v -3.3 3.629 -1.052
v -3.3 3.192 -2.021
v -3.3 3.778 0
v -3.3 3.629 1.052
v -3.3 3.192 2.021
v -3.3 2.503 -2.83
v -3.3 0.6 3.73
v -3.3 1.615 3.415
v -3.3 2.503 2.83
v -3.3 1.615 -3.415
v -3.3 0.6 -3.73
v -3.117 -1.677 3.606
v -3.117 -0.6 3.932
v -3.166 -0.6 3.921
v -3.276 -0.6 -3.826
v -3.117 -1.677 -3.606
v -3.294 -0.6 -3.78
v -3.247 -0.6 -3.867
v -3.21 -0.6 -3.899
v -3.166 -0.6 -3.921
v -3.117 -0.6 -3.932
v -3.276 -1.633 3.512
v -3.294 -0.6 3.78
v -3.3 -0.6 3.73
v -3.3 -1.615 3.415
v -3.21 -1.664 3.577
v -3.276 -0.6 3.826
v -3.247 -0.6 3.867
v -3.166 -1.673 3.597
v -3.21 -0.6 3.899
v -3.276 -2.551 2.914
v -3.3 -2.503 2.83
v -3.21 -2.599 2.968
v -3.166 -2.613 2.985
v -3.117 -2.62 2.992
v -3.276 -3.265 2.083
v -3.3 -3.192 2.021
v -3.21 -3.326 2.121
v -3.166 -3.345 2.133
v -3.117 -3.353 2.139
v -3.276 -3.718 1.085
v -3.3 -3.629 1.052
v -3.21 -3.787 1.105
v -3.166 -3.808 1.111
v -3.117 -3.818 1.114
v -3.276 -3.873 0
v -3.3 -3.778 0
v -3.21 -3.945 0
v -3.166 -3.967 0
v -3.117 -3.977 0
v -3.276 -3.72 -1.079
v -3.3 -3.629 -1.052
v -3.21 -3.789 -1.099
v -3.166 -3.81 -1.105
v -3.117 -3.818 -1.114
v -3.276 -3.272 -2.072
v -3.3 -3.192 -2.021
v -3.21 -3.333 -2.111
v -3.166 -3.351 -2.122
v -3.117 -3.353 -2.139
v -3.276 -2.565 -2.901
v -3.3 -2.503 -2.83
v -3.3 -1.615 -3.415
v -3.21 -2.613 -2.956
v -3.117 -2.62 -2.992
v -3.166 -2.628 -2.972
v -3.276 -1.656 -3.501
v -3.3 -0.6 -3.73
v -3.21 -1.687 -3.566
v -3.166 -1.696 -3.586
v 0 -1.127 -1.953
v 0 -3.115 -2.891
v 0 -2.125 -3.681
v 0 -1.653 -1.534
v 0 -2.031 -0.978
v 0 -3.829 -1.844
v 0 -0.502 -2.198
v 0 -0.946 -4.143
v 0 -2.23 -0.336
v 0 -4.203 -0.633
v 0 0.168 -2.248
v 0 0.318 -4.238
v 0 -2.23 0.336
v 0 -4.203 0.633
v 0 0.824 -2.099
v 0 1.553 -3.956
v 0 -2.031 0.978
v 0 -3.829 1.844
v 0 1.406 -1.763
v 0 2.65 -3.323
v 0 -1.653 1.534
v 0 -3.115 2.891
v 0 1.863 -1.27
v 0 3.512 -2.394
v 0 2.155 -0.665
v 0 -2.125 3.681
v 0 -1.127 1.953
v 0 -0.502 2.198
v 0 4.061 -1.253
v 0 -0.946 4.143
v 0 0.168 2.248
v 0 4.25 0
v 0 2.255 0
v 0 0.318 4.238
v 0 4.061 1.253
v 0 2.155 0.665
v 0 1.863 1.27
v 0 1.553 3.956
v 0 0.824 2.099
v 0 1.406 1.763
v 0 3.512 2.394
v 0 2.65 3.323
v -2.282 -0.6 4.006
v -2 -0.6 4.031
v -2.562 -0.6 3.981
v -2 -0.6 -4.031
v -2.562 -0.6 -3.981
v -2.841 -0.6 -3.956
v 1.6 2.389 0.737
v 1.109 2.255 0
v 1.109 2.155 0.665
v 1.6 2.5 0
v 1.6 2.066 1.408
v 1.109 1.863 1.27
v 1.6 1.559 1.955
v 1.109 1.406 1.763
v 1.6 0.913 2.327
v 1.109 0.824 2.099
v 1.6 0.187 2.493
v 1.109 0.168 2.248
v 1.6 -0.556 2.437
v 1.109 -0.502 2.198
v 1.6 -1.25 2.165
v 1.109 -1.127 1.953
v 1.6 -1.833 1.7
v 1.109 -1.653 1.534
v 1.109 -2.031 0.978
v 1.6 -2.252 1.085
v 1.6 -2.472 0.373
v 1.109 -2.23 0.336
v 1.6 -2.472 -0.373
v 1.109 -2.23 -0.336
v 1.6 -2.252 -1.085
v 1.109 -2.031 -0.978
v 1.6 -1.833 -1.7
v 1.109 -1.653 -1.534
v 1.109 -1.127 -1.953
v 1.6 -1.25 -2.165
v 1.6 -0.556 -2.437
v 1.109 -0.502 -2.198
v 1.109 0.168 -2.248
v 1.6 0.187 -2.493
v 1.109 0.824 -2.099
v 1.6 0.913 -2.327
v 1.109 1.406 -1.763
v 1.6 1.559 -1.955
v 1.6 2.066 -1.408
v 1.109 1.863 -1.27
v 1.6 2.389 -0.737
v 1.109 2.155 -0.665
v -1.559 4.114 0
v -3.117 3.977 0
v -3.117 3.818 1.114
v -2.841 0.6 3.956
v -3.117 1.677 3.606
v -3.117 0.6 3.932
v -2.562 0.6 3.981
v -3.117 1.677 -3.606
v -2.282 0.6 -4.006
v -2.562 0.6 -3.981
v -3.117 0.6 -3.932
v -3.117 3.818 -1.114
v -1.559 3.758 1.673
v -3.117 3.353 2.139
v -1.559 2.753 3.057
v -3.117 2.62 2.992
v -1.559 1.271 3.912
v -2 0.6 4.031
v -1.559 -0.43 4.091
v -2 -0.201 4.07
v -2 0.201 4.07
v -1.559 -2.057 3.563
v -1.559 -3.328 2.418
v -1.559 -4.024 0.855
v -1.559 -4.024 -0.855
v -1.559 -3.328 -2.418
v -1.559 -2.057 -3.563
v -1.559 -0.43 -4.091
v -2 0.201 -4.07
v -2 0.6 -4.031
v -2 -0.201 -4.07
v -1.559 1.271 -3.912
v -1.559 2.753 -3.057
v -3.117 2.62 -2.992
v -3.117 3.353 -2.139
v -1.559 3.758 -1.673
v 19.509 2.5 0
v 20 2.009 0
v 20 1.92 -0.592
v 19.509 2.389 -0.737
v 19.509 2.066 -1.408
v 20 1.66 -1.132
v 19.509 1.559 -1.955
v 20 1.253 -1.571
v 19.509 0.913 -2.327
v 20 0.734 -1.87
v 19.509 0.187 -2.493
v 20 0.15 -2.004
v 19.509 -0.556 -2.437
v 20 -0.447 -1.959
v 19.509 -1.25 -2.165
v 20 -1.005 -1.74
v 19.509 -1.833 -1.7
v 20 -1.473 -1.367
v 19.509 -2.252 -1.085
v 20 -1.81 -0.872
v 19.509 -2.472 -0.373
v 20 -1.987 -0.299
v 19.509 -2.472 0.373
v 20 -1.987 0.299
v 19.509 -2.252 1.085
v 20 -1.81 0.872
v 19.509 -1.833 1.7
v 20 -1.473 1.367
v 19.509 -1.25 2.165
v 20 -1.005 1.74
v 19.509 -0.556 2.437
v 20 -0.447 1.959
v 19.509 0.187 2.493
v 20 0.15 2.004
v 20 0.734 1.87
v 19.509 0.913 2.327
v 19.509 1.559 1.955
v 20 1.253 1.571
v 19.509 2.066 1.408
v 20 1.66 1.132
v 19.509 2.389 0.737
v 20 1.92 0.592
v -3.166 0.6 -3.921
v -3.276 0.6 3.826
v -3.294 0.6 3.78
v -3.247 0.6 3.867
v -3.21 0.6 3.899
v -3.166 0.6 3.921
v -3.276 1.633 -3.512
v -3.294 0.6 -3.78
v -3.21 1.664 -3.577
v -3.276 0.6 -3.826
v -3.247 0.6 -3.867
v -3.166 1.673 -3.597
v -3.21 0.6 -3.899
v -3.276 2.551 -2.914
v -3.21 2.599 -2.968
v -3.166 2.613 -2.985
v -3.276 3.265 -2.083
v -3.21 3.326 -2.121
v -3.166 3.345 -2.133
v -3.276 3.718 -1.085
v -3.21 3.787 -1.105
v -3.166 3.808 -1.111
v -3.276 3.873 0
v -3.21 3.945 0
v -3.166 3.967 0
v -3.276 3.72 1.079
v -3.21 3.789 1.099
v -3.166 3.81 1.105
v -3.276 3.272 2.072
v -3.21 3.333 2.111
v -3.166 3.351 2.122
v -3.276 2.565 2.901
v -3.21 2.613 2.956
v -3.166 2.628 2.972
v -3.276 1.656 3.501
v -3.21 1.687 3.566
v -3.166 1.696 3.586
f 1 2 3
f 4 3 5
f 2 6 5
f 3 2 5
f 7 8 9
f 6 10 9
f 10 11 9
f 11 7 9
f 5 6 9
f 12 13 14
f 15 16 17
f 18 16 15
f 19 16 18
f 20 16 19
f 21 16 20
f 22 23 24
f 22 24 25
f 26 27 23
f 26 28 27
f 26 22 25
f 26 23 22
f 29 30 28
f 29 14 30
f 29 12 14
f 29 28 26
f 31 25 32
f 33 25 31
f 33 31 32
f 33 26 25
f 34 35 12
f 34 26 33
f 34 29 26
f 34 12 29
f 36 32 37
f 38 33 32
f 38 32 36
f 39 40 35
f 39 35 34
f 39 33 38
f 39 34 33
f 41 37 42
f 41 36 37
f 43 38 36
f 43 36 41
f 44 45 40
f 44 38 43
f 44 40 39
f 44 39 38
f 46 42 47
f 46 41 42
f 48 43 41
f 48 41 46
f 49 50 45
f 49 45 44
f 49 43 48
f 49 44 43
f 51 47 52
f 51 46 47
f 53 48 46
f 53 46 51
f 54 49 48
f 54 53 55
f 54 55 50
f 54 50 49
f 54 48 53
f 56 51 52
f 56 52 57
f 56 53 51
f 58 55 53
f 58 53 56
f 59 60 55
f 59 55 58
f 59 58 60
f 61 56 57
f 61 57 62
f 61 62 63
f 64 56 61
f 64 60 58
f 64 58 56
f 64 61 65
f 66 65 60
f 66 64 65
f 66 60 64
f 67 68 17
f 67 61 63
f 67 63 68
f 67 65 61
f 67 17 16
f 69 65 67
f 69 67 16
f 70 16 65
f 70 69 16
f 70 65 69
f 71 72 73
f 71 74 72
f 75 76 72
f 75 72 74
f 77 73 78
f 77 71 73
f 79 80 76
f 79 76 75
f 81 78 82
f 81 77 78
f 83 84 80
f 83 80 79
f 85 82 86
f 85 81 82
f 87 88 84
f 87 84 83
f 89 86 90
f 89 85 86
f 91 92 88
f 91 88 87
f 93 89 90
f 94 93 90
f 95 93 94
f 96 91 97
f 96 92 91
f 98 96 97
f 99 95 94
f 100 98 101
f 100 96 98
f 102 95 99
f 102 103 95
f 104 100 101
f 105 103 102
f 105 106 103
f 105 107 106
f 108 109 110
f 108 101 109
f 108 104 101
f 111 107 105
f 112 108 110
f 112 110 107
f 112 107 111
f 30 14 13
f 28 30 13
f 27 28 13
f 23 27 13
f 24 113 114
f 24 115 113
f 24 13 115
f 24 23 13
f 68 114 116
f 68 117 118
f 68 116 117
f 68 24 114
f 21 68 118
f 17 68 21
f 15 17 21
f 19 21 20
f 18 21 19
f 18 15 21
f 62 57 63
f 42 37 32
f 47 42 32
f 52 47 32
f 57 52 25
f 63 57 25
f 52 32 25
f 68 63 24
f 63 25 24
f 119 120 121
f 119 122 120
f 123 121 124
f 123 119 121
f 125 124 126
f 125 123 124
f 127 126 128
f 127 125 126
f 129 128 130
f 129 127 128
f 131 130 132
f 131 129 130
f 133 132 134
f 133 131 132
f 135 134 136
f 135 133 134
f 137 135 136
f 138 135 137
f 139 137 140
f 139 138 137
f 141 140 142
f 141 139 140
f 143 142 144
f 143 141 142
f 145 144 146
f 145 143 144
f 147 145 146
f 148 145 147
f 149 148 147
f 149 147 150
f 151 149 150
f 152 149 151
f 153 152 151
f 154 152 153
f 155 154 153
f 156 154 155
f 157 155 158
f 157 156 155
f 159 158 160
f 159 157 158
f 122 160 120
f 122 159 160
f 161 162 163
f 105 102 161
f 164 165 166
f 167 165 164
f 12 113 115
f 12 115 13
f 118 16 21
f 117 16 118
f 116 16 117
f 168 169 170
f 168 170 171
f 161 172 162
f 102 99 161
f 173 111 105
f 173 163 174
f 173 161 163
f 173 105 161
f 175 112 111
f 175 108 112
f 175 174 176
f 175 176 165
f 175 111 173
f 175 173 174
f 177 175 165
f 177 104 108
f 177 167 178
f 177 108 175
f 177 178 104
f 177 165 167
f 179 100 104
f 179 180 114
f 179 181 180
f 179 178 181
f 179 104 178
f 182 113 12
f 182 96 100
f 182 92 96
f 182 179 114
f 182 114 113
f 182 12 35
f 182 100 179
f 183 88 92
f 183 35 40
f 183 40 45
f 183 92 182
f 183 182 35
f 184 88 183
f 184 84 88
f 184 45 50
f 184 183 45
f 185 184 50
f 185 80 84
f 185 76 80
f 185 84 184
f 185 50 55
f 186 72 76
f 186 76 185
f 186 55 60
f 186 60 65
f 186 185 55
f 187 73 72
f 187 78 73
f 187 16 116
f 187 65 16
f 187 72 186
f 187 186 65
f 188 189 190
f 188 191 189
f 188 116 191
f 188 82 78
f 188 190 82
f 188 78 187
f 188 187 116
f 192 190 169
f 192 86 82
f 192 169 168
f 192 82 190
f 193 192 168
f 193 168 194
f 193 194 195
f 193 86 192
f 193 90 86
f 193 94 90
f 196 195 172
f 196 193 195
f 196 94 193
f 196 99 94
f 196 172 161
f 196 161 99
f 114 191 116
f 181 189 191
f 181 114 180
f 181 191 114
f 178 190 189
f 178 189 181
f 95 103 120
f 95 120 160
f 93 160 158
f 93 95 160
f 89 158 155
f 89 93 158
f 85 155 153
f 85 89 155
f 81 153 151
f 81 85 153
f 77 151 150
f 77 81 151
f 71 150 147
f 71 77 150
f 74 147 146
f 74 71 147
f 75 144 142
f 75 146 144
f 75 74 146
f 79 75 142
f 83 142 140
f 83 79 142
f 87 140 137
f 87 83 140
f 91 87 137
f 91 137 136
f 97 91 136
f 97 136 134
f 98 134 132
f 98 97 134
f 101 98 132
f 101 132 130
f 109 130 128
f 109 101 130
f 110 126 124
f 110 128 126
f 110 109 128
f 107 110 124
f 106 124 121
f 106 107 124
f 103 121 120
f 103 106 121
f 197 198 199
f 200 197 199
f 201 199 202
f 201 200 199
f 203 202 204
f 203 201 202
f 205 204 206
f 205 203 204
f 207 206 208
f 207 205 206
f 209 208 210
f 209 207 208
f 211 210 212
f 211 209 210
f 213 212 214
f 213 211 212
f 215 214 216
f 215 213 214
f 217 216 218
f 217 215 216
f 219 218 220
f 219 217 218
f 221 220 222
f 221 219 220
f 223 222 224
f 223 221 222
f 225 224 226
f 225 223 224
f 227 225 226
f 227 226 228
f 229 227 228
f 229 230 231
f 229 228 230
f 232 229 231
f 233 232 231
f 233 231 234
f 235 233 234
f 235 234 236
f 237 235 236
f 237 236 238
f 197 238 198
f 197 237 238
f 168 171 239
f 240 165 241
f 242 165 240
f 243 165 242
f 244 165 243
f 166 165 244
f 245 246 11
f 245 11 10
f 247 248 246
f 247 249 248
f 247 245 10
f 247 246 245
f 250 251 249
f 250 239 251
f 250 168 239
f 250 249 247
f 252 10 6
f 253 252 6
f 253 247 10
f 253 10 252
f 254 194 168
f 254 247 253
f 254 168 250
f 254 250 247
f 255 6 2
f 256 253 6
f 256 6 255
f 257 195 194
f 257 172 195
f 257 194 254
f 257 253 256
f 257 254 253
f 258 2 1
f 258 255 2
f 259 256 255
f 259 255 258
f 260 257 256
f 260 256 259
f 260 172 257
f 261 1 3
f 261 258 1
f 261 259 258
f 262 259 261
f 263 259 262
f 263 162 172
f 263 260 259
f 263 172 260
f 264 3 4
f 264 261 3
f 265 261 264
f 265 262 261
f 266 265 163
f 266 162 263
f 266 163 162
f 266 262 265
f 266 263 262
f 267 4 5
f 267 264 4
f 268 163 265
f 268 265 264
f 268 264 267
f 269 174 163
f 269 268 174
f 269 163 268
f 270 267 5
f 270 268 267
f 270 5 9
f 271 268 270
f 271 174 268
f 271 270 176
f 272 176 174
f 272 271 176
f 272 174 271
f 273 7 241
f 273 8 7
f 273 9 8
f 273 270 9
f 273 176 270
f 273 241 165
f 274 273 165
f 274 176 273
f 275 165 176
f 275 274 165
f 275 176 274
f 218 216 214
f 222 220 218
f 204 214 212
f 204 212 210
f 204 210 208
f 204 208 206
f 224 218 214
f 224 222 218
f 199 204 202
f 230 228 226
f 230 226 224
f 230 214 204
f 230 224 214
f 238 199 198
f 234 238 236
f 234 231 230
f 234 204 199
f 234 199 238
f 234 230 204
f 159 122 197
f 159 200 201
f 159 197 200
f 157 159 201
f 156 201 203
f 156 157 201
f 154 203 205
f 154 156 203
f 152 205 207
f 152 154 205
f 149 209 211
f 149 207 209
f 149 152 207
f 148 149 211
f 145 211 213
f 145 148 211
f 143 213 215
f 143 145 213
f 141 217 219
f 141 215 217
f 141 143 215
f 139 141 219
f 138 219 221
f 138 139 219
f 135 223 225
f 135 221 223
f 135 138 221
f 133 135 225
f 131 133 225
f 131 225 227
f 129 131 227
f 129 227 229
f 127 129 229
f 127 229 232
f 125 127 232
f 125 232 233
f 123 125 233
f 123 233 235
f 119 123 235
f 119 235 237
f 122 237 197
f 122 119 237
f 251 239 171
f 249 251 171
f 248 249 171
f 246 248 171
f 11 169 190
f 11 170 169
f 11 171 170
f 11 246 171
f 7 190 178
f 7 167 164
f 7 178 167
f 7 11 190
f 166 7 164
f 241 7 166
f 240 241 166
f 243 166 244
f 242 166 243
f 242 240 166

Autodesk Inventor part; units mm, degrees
ref_plane "YZ Plane" through (0, 0, 0) normal (1, 0, 0) x (0, 1, 0)
ref_plane "XZ Plane" through (0, 0, 0) normal (0, 1, 0) x (-1, 0, 0)
sketch "Sketch1" plane through (0, 0, 0) normal (0, 0, 1) x (1, 0, 0)
  line L0 (-3.3, 0) -> (20, 0)
  line L1 (20, 0) -> (20, 2.5)
  line L2 (20, 2.5) -> (1.6, 2.5)
  line L3 (1.6, 2.5) -> (1.1091, 2.2547)
  line L4 (1.1091, 2.2547) -> (0, 2.2547)
  line L5 (0, 2.2547) -> (0, 4.25)
  line L6 (-7.96, 0) -> (24.66, 0) projected
  line L7 (0, -0.85) -> (0, 5.1) projected
  line L8 (-3.3, 0) -> (-3.3, 3.9613)
  line L9 (0, 4.25) -> (-3.3, 3.9613)
  line L10 (1.6, 2.5) -> (0, 2.5) construction
  dimension "d0" = 20
  dimension "d1" = 18.4
  dimension "d2" = 0.4909
  dimension "d3" = 3.3
  dimension "d4" = 5
  dimension "d5" = 4.5095
  dimension "d9" = 8.5
  dimension "d10" = 5
revolve "Body" add sketch "Sketch1" angle 360 about axis through (-3.3, 0, 0) along (1, 0, 0)
sketch "Sketch2" plane through (-3.3, 0, 0) normal (-1, 0, 0) x (0, 0, 1)
  circle A0 centre (0, 0) radius 4.25 projected
  line L0 (0, 0) -> (0, 3.9613) projected
  line L1 (-4.25, 0.6) -> (4.25, 0.6)
  line L2 (4.25, 0.6) -> (4.25, -0.6)
  line L3 (4.25, -0.6) -> (-4.25, -0.6)
  line L4 (-4.25, -0.6) -> (-4.25, 0.6)
  line L5 (-4.25, 0) -> (4.25, 0) construction
  line L6 (0, 0.6) -> (0, -0.6) construction
  point P0 (0, 0)
  dimension "d11" = 1.2
  dimension "d12" = 8.5
fillet "Fillet1" radius 0.2 1 edges at (-3.3, -3.9613, 0)
extrude "Slot" cut sketch "Sketch2" against normal blind 1.3 contours A0 L3 L1 | L2 L3 A0 | A0 L1 L2 | A0 L4 L1 | L3 L4 A0
thread "Thread" size "M5x0.8" class "6g" standard "ISO Metric profile" length 18.4
chamfer "Chamfer1" distance 0.4908 distance2 0.4909 1 edges at (20, -2.5, 0) measured on face at (20, 1.2612, -0.6619)
ref_plane "Work Plane1" through (30.1625, 0, 0) normal (0, 0, -1) x (1, 0, 0)
equation "\"d11\" = SBR"
equation "\"d12\" = KOD"
equation "\"d19\" = STI"
equation "\"d14\" = RR"
equation "\"d15\" = GEL"
equation "\"d17\" = -0.5 * SPD + 0.5 * GD"
equation "\"d0\" = NLG"
equation "\"d1\" = GEL"
equation "\"d3\" = KOH"
equation "\"d4\" = GD"
equation "\"d5\" = BDM"
equation "\"d9\" = KOD"
equation "\"d10\" = KEWI"
equation "\"GD\" = NND"
equation "\"NLG\" = 20"
equation "\"GEL\" = 18.4"
equation "\"KOD\" = 8.5"
equation "\"KOH\" = 3.3"
equation "\"GAL\" = 0.61345 * PTC"
equation "\"SPD\" = NND - 1.2269 * PTC"
equation "\"BDM\" = 4.5095"
equation "\"GUL\" = 0.61345 * PTC"
equation "\"RR\" = 0.2"
equation "\"SBR\" = 1.2"
equation "\"STI\" = 1.3"
equation "\"KEWI\" = 5deg"
equation "\"PTC\" = 0.8"
equation "\"THREADDIA\" = 5"
equation "\"TOA\" = 30deg"
equation "\"NND\" = 5"
equation "\"GD1\" = THREADDIA - 1.2269 * PTC"
properties part number "ISO 1207 - M5 x 20" material "Stainless Steel, 440C"
